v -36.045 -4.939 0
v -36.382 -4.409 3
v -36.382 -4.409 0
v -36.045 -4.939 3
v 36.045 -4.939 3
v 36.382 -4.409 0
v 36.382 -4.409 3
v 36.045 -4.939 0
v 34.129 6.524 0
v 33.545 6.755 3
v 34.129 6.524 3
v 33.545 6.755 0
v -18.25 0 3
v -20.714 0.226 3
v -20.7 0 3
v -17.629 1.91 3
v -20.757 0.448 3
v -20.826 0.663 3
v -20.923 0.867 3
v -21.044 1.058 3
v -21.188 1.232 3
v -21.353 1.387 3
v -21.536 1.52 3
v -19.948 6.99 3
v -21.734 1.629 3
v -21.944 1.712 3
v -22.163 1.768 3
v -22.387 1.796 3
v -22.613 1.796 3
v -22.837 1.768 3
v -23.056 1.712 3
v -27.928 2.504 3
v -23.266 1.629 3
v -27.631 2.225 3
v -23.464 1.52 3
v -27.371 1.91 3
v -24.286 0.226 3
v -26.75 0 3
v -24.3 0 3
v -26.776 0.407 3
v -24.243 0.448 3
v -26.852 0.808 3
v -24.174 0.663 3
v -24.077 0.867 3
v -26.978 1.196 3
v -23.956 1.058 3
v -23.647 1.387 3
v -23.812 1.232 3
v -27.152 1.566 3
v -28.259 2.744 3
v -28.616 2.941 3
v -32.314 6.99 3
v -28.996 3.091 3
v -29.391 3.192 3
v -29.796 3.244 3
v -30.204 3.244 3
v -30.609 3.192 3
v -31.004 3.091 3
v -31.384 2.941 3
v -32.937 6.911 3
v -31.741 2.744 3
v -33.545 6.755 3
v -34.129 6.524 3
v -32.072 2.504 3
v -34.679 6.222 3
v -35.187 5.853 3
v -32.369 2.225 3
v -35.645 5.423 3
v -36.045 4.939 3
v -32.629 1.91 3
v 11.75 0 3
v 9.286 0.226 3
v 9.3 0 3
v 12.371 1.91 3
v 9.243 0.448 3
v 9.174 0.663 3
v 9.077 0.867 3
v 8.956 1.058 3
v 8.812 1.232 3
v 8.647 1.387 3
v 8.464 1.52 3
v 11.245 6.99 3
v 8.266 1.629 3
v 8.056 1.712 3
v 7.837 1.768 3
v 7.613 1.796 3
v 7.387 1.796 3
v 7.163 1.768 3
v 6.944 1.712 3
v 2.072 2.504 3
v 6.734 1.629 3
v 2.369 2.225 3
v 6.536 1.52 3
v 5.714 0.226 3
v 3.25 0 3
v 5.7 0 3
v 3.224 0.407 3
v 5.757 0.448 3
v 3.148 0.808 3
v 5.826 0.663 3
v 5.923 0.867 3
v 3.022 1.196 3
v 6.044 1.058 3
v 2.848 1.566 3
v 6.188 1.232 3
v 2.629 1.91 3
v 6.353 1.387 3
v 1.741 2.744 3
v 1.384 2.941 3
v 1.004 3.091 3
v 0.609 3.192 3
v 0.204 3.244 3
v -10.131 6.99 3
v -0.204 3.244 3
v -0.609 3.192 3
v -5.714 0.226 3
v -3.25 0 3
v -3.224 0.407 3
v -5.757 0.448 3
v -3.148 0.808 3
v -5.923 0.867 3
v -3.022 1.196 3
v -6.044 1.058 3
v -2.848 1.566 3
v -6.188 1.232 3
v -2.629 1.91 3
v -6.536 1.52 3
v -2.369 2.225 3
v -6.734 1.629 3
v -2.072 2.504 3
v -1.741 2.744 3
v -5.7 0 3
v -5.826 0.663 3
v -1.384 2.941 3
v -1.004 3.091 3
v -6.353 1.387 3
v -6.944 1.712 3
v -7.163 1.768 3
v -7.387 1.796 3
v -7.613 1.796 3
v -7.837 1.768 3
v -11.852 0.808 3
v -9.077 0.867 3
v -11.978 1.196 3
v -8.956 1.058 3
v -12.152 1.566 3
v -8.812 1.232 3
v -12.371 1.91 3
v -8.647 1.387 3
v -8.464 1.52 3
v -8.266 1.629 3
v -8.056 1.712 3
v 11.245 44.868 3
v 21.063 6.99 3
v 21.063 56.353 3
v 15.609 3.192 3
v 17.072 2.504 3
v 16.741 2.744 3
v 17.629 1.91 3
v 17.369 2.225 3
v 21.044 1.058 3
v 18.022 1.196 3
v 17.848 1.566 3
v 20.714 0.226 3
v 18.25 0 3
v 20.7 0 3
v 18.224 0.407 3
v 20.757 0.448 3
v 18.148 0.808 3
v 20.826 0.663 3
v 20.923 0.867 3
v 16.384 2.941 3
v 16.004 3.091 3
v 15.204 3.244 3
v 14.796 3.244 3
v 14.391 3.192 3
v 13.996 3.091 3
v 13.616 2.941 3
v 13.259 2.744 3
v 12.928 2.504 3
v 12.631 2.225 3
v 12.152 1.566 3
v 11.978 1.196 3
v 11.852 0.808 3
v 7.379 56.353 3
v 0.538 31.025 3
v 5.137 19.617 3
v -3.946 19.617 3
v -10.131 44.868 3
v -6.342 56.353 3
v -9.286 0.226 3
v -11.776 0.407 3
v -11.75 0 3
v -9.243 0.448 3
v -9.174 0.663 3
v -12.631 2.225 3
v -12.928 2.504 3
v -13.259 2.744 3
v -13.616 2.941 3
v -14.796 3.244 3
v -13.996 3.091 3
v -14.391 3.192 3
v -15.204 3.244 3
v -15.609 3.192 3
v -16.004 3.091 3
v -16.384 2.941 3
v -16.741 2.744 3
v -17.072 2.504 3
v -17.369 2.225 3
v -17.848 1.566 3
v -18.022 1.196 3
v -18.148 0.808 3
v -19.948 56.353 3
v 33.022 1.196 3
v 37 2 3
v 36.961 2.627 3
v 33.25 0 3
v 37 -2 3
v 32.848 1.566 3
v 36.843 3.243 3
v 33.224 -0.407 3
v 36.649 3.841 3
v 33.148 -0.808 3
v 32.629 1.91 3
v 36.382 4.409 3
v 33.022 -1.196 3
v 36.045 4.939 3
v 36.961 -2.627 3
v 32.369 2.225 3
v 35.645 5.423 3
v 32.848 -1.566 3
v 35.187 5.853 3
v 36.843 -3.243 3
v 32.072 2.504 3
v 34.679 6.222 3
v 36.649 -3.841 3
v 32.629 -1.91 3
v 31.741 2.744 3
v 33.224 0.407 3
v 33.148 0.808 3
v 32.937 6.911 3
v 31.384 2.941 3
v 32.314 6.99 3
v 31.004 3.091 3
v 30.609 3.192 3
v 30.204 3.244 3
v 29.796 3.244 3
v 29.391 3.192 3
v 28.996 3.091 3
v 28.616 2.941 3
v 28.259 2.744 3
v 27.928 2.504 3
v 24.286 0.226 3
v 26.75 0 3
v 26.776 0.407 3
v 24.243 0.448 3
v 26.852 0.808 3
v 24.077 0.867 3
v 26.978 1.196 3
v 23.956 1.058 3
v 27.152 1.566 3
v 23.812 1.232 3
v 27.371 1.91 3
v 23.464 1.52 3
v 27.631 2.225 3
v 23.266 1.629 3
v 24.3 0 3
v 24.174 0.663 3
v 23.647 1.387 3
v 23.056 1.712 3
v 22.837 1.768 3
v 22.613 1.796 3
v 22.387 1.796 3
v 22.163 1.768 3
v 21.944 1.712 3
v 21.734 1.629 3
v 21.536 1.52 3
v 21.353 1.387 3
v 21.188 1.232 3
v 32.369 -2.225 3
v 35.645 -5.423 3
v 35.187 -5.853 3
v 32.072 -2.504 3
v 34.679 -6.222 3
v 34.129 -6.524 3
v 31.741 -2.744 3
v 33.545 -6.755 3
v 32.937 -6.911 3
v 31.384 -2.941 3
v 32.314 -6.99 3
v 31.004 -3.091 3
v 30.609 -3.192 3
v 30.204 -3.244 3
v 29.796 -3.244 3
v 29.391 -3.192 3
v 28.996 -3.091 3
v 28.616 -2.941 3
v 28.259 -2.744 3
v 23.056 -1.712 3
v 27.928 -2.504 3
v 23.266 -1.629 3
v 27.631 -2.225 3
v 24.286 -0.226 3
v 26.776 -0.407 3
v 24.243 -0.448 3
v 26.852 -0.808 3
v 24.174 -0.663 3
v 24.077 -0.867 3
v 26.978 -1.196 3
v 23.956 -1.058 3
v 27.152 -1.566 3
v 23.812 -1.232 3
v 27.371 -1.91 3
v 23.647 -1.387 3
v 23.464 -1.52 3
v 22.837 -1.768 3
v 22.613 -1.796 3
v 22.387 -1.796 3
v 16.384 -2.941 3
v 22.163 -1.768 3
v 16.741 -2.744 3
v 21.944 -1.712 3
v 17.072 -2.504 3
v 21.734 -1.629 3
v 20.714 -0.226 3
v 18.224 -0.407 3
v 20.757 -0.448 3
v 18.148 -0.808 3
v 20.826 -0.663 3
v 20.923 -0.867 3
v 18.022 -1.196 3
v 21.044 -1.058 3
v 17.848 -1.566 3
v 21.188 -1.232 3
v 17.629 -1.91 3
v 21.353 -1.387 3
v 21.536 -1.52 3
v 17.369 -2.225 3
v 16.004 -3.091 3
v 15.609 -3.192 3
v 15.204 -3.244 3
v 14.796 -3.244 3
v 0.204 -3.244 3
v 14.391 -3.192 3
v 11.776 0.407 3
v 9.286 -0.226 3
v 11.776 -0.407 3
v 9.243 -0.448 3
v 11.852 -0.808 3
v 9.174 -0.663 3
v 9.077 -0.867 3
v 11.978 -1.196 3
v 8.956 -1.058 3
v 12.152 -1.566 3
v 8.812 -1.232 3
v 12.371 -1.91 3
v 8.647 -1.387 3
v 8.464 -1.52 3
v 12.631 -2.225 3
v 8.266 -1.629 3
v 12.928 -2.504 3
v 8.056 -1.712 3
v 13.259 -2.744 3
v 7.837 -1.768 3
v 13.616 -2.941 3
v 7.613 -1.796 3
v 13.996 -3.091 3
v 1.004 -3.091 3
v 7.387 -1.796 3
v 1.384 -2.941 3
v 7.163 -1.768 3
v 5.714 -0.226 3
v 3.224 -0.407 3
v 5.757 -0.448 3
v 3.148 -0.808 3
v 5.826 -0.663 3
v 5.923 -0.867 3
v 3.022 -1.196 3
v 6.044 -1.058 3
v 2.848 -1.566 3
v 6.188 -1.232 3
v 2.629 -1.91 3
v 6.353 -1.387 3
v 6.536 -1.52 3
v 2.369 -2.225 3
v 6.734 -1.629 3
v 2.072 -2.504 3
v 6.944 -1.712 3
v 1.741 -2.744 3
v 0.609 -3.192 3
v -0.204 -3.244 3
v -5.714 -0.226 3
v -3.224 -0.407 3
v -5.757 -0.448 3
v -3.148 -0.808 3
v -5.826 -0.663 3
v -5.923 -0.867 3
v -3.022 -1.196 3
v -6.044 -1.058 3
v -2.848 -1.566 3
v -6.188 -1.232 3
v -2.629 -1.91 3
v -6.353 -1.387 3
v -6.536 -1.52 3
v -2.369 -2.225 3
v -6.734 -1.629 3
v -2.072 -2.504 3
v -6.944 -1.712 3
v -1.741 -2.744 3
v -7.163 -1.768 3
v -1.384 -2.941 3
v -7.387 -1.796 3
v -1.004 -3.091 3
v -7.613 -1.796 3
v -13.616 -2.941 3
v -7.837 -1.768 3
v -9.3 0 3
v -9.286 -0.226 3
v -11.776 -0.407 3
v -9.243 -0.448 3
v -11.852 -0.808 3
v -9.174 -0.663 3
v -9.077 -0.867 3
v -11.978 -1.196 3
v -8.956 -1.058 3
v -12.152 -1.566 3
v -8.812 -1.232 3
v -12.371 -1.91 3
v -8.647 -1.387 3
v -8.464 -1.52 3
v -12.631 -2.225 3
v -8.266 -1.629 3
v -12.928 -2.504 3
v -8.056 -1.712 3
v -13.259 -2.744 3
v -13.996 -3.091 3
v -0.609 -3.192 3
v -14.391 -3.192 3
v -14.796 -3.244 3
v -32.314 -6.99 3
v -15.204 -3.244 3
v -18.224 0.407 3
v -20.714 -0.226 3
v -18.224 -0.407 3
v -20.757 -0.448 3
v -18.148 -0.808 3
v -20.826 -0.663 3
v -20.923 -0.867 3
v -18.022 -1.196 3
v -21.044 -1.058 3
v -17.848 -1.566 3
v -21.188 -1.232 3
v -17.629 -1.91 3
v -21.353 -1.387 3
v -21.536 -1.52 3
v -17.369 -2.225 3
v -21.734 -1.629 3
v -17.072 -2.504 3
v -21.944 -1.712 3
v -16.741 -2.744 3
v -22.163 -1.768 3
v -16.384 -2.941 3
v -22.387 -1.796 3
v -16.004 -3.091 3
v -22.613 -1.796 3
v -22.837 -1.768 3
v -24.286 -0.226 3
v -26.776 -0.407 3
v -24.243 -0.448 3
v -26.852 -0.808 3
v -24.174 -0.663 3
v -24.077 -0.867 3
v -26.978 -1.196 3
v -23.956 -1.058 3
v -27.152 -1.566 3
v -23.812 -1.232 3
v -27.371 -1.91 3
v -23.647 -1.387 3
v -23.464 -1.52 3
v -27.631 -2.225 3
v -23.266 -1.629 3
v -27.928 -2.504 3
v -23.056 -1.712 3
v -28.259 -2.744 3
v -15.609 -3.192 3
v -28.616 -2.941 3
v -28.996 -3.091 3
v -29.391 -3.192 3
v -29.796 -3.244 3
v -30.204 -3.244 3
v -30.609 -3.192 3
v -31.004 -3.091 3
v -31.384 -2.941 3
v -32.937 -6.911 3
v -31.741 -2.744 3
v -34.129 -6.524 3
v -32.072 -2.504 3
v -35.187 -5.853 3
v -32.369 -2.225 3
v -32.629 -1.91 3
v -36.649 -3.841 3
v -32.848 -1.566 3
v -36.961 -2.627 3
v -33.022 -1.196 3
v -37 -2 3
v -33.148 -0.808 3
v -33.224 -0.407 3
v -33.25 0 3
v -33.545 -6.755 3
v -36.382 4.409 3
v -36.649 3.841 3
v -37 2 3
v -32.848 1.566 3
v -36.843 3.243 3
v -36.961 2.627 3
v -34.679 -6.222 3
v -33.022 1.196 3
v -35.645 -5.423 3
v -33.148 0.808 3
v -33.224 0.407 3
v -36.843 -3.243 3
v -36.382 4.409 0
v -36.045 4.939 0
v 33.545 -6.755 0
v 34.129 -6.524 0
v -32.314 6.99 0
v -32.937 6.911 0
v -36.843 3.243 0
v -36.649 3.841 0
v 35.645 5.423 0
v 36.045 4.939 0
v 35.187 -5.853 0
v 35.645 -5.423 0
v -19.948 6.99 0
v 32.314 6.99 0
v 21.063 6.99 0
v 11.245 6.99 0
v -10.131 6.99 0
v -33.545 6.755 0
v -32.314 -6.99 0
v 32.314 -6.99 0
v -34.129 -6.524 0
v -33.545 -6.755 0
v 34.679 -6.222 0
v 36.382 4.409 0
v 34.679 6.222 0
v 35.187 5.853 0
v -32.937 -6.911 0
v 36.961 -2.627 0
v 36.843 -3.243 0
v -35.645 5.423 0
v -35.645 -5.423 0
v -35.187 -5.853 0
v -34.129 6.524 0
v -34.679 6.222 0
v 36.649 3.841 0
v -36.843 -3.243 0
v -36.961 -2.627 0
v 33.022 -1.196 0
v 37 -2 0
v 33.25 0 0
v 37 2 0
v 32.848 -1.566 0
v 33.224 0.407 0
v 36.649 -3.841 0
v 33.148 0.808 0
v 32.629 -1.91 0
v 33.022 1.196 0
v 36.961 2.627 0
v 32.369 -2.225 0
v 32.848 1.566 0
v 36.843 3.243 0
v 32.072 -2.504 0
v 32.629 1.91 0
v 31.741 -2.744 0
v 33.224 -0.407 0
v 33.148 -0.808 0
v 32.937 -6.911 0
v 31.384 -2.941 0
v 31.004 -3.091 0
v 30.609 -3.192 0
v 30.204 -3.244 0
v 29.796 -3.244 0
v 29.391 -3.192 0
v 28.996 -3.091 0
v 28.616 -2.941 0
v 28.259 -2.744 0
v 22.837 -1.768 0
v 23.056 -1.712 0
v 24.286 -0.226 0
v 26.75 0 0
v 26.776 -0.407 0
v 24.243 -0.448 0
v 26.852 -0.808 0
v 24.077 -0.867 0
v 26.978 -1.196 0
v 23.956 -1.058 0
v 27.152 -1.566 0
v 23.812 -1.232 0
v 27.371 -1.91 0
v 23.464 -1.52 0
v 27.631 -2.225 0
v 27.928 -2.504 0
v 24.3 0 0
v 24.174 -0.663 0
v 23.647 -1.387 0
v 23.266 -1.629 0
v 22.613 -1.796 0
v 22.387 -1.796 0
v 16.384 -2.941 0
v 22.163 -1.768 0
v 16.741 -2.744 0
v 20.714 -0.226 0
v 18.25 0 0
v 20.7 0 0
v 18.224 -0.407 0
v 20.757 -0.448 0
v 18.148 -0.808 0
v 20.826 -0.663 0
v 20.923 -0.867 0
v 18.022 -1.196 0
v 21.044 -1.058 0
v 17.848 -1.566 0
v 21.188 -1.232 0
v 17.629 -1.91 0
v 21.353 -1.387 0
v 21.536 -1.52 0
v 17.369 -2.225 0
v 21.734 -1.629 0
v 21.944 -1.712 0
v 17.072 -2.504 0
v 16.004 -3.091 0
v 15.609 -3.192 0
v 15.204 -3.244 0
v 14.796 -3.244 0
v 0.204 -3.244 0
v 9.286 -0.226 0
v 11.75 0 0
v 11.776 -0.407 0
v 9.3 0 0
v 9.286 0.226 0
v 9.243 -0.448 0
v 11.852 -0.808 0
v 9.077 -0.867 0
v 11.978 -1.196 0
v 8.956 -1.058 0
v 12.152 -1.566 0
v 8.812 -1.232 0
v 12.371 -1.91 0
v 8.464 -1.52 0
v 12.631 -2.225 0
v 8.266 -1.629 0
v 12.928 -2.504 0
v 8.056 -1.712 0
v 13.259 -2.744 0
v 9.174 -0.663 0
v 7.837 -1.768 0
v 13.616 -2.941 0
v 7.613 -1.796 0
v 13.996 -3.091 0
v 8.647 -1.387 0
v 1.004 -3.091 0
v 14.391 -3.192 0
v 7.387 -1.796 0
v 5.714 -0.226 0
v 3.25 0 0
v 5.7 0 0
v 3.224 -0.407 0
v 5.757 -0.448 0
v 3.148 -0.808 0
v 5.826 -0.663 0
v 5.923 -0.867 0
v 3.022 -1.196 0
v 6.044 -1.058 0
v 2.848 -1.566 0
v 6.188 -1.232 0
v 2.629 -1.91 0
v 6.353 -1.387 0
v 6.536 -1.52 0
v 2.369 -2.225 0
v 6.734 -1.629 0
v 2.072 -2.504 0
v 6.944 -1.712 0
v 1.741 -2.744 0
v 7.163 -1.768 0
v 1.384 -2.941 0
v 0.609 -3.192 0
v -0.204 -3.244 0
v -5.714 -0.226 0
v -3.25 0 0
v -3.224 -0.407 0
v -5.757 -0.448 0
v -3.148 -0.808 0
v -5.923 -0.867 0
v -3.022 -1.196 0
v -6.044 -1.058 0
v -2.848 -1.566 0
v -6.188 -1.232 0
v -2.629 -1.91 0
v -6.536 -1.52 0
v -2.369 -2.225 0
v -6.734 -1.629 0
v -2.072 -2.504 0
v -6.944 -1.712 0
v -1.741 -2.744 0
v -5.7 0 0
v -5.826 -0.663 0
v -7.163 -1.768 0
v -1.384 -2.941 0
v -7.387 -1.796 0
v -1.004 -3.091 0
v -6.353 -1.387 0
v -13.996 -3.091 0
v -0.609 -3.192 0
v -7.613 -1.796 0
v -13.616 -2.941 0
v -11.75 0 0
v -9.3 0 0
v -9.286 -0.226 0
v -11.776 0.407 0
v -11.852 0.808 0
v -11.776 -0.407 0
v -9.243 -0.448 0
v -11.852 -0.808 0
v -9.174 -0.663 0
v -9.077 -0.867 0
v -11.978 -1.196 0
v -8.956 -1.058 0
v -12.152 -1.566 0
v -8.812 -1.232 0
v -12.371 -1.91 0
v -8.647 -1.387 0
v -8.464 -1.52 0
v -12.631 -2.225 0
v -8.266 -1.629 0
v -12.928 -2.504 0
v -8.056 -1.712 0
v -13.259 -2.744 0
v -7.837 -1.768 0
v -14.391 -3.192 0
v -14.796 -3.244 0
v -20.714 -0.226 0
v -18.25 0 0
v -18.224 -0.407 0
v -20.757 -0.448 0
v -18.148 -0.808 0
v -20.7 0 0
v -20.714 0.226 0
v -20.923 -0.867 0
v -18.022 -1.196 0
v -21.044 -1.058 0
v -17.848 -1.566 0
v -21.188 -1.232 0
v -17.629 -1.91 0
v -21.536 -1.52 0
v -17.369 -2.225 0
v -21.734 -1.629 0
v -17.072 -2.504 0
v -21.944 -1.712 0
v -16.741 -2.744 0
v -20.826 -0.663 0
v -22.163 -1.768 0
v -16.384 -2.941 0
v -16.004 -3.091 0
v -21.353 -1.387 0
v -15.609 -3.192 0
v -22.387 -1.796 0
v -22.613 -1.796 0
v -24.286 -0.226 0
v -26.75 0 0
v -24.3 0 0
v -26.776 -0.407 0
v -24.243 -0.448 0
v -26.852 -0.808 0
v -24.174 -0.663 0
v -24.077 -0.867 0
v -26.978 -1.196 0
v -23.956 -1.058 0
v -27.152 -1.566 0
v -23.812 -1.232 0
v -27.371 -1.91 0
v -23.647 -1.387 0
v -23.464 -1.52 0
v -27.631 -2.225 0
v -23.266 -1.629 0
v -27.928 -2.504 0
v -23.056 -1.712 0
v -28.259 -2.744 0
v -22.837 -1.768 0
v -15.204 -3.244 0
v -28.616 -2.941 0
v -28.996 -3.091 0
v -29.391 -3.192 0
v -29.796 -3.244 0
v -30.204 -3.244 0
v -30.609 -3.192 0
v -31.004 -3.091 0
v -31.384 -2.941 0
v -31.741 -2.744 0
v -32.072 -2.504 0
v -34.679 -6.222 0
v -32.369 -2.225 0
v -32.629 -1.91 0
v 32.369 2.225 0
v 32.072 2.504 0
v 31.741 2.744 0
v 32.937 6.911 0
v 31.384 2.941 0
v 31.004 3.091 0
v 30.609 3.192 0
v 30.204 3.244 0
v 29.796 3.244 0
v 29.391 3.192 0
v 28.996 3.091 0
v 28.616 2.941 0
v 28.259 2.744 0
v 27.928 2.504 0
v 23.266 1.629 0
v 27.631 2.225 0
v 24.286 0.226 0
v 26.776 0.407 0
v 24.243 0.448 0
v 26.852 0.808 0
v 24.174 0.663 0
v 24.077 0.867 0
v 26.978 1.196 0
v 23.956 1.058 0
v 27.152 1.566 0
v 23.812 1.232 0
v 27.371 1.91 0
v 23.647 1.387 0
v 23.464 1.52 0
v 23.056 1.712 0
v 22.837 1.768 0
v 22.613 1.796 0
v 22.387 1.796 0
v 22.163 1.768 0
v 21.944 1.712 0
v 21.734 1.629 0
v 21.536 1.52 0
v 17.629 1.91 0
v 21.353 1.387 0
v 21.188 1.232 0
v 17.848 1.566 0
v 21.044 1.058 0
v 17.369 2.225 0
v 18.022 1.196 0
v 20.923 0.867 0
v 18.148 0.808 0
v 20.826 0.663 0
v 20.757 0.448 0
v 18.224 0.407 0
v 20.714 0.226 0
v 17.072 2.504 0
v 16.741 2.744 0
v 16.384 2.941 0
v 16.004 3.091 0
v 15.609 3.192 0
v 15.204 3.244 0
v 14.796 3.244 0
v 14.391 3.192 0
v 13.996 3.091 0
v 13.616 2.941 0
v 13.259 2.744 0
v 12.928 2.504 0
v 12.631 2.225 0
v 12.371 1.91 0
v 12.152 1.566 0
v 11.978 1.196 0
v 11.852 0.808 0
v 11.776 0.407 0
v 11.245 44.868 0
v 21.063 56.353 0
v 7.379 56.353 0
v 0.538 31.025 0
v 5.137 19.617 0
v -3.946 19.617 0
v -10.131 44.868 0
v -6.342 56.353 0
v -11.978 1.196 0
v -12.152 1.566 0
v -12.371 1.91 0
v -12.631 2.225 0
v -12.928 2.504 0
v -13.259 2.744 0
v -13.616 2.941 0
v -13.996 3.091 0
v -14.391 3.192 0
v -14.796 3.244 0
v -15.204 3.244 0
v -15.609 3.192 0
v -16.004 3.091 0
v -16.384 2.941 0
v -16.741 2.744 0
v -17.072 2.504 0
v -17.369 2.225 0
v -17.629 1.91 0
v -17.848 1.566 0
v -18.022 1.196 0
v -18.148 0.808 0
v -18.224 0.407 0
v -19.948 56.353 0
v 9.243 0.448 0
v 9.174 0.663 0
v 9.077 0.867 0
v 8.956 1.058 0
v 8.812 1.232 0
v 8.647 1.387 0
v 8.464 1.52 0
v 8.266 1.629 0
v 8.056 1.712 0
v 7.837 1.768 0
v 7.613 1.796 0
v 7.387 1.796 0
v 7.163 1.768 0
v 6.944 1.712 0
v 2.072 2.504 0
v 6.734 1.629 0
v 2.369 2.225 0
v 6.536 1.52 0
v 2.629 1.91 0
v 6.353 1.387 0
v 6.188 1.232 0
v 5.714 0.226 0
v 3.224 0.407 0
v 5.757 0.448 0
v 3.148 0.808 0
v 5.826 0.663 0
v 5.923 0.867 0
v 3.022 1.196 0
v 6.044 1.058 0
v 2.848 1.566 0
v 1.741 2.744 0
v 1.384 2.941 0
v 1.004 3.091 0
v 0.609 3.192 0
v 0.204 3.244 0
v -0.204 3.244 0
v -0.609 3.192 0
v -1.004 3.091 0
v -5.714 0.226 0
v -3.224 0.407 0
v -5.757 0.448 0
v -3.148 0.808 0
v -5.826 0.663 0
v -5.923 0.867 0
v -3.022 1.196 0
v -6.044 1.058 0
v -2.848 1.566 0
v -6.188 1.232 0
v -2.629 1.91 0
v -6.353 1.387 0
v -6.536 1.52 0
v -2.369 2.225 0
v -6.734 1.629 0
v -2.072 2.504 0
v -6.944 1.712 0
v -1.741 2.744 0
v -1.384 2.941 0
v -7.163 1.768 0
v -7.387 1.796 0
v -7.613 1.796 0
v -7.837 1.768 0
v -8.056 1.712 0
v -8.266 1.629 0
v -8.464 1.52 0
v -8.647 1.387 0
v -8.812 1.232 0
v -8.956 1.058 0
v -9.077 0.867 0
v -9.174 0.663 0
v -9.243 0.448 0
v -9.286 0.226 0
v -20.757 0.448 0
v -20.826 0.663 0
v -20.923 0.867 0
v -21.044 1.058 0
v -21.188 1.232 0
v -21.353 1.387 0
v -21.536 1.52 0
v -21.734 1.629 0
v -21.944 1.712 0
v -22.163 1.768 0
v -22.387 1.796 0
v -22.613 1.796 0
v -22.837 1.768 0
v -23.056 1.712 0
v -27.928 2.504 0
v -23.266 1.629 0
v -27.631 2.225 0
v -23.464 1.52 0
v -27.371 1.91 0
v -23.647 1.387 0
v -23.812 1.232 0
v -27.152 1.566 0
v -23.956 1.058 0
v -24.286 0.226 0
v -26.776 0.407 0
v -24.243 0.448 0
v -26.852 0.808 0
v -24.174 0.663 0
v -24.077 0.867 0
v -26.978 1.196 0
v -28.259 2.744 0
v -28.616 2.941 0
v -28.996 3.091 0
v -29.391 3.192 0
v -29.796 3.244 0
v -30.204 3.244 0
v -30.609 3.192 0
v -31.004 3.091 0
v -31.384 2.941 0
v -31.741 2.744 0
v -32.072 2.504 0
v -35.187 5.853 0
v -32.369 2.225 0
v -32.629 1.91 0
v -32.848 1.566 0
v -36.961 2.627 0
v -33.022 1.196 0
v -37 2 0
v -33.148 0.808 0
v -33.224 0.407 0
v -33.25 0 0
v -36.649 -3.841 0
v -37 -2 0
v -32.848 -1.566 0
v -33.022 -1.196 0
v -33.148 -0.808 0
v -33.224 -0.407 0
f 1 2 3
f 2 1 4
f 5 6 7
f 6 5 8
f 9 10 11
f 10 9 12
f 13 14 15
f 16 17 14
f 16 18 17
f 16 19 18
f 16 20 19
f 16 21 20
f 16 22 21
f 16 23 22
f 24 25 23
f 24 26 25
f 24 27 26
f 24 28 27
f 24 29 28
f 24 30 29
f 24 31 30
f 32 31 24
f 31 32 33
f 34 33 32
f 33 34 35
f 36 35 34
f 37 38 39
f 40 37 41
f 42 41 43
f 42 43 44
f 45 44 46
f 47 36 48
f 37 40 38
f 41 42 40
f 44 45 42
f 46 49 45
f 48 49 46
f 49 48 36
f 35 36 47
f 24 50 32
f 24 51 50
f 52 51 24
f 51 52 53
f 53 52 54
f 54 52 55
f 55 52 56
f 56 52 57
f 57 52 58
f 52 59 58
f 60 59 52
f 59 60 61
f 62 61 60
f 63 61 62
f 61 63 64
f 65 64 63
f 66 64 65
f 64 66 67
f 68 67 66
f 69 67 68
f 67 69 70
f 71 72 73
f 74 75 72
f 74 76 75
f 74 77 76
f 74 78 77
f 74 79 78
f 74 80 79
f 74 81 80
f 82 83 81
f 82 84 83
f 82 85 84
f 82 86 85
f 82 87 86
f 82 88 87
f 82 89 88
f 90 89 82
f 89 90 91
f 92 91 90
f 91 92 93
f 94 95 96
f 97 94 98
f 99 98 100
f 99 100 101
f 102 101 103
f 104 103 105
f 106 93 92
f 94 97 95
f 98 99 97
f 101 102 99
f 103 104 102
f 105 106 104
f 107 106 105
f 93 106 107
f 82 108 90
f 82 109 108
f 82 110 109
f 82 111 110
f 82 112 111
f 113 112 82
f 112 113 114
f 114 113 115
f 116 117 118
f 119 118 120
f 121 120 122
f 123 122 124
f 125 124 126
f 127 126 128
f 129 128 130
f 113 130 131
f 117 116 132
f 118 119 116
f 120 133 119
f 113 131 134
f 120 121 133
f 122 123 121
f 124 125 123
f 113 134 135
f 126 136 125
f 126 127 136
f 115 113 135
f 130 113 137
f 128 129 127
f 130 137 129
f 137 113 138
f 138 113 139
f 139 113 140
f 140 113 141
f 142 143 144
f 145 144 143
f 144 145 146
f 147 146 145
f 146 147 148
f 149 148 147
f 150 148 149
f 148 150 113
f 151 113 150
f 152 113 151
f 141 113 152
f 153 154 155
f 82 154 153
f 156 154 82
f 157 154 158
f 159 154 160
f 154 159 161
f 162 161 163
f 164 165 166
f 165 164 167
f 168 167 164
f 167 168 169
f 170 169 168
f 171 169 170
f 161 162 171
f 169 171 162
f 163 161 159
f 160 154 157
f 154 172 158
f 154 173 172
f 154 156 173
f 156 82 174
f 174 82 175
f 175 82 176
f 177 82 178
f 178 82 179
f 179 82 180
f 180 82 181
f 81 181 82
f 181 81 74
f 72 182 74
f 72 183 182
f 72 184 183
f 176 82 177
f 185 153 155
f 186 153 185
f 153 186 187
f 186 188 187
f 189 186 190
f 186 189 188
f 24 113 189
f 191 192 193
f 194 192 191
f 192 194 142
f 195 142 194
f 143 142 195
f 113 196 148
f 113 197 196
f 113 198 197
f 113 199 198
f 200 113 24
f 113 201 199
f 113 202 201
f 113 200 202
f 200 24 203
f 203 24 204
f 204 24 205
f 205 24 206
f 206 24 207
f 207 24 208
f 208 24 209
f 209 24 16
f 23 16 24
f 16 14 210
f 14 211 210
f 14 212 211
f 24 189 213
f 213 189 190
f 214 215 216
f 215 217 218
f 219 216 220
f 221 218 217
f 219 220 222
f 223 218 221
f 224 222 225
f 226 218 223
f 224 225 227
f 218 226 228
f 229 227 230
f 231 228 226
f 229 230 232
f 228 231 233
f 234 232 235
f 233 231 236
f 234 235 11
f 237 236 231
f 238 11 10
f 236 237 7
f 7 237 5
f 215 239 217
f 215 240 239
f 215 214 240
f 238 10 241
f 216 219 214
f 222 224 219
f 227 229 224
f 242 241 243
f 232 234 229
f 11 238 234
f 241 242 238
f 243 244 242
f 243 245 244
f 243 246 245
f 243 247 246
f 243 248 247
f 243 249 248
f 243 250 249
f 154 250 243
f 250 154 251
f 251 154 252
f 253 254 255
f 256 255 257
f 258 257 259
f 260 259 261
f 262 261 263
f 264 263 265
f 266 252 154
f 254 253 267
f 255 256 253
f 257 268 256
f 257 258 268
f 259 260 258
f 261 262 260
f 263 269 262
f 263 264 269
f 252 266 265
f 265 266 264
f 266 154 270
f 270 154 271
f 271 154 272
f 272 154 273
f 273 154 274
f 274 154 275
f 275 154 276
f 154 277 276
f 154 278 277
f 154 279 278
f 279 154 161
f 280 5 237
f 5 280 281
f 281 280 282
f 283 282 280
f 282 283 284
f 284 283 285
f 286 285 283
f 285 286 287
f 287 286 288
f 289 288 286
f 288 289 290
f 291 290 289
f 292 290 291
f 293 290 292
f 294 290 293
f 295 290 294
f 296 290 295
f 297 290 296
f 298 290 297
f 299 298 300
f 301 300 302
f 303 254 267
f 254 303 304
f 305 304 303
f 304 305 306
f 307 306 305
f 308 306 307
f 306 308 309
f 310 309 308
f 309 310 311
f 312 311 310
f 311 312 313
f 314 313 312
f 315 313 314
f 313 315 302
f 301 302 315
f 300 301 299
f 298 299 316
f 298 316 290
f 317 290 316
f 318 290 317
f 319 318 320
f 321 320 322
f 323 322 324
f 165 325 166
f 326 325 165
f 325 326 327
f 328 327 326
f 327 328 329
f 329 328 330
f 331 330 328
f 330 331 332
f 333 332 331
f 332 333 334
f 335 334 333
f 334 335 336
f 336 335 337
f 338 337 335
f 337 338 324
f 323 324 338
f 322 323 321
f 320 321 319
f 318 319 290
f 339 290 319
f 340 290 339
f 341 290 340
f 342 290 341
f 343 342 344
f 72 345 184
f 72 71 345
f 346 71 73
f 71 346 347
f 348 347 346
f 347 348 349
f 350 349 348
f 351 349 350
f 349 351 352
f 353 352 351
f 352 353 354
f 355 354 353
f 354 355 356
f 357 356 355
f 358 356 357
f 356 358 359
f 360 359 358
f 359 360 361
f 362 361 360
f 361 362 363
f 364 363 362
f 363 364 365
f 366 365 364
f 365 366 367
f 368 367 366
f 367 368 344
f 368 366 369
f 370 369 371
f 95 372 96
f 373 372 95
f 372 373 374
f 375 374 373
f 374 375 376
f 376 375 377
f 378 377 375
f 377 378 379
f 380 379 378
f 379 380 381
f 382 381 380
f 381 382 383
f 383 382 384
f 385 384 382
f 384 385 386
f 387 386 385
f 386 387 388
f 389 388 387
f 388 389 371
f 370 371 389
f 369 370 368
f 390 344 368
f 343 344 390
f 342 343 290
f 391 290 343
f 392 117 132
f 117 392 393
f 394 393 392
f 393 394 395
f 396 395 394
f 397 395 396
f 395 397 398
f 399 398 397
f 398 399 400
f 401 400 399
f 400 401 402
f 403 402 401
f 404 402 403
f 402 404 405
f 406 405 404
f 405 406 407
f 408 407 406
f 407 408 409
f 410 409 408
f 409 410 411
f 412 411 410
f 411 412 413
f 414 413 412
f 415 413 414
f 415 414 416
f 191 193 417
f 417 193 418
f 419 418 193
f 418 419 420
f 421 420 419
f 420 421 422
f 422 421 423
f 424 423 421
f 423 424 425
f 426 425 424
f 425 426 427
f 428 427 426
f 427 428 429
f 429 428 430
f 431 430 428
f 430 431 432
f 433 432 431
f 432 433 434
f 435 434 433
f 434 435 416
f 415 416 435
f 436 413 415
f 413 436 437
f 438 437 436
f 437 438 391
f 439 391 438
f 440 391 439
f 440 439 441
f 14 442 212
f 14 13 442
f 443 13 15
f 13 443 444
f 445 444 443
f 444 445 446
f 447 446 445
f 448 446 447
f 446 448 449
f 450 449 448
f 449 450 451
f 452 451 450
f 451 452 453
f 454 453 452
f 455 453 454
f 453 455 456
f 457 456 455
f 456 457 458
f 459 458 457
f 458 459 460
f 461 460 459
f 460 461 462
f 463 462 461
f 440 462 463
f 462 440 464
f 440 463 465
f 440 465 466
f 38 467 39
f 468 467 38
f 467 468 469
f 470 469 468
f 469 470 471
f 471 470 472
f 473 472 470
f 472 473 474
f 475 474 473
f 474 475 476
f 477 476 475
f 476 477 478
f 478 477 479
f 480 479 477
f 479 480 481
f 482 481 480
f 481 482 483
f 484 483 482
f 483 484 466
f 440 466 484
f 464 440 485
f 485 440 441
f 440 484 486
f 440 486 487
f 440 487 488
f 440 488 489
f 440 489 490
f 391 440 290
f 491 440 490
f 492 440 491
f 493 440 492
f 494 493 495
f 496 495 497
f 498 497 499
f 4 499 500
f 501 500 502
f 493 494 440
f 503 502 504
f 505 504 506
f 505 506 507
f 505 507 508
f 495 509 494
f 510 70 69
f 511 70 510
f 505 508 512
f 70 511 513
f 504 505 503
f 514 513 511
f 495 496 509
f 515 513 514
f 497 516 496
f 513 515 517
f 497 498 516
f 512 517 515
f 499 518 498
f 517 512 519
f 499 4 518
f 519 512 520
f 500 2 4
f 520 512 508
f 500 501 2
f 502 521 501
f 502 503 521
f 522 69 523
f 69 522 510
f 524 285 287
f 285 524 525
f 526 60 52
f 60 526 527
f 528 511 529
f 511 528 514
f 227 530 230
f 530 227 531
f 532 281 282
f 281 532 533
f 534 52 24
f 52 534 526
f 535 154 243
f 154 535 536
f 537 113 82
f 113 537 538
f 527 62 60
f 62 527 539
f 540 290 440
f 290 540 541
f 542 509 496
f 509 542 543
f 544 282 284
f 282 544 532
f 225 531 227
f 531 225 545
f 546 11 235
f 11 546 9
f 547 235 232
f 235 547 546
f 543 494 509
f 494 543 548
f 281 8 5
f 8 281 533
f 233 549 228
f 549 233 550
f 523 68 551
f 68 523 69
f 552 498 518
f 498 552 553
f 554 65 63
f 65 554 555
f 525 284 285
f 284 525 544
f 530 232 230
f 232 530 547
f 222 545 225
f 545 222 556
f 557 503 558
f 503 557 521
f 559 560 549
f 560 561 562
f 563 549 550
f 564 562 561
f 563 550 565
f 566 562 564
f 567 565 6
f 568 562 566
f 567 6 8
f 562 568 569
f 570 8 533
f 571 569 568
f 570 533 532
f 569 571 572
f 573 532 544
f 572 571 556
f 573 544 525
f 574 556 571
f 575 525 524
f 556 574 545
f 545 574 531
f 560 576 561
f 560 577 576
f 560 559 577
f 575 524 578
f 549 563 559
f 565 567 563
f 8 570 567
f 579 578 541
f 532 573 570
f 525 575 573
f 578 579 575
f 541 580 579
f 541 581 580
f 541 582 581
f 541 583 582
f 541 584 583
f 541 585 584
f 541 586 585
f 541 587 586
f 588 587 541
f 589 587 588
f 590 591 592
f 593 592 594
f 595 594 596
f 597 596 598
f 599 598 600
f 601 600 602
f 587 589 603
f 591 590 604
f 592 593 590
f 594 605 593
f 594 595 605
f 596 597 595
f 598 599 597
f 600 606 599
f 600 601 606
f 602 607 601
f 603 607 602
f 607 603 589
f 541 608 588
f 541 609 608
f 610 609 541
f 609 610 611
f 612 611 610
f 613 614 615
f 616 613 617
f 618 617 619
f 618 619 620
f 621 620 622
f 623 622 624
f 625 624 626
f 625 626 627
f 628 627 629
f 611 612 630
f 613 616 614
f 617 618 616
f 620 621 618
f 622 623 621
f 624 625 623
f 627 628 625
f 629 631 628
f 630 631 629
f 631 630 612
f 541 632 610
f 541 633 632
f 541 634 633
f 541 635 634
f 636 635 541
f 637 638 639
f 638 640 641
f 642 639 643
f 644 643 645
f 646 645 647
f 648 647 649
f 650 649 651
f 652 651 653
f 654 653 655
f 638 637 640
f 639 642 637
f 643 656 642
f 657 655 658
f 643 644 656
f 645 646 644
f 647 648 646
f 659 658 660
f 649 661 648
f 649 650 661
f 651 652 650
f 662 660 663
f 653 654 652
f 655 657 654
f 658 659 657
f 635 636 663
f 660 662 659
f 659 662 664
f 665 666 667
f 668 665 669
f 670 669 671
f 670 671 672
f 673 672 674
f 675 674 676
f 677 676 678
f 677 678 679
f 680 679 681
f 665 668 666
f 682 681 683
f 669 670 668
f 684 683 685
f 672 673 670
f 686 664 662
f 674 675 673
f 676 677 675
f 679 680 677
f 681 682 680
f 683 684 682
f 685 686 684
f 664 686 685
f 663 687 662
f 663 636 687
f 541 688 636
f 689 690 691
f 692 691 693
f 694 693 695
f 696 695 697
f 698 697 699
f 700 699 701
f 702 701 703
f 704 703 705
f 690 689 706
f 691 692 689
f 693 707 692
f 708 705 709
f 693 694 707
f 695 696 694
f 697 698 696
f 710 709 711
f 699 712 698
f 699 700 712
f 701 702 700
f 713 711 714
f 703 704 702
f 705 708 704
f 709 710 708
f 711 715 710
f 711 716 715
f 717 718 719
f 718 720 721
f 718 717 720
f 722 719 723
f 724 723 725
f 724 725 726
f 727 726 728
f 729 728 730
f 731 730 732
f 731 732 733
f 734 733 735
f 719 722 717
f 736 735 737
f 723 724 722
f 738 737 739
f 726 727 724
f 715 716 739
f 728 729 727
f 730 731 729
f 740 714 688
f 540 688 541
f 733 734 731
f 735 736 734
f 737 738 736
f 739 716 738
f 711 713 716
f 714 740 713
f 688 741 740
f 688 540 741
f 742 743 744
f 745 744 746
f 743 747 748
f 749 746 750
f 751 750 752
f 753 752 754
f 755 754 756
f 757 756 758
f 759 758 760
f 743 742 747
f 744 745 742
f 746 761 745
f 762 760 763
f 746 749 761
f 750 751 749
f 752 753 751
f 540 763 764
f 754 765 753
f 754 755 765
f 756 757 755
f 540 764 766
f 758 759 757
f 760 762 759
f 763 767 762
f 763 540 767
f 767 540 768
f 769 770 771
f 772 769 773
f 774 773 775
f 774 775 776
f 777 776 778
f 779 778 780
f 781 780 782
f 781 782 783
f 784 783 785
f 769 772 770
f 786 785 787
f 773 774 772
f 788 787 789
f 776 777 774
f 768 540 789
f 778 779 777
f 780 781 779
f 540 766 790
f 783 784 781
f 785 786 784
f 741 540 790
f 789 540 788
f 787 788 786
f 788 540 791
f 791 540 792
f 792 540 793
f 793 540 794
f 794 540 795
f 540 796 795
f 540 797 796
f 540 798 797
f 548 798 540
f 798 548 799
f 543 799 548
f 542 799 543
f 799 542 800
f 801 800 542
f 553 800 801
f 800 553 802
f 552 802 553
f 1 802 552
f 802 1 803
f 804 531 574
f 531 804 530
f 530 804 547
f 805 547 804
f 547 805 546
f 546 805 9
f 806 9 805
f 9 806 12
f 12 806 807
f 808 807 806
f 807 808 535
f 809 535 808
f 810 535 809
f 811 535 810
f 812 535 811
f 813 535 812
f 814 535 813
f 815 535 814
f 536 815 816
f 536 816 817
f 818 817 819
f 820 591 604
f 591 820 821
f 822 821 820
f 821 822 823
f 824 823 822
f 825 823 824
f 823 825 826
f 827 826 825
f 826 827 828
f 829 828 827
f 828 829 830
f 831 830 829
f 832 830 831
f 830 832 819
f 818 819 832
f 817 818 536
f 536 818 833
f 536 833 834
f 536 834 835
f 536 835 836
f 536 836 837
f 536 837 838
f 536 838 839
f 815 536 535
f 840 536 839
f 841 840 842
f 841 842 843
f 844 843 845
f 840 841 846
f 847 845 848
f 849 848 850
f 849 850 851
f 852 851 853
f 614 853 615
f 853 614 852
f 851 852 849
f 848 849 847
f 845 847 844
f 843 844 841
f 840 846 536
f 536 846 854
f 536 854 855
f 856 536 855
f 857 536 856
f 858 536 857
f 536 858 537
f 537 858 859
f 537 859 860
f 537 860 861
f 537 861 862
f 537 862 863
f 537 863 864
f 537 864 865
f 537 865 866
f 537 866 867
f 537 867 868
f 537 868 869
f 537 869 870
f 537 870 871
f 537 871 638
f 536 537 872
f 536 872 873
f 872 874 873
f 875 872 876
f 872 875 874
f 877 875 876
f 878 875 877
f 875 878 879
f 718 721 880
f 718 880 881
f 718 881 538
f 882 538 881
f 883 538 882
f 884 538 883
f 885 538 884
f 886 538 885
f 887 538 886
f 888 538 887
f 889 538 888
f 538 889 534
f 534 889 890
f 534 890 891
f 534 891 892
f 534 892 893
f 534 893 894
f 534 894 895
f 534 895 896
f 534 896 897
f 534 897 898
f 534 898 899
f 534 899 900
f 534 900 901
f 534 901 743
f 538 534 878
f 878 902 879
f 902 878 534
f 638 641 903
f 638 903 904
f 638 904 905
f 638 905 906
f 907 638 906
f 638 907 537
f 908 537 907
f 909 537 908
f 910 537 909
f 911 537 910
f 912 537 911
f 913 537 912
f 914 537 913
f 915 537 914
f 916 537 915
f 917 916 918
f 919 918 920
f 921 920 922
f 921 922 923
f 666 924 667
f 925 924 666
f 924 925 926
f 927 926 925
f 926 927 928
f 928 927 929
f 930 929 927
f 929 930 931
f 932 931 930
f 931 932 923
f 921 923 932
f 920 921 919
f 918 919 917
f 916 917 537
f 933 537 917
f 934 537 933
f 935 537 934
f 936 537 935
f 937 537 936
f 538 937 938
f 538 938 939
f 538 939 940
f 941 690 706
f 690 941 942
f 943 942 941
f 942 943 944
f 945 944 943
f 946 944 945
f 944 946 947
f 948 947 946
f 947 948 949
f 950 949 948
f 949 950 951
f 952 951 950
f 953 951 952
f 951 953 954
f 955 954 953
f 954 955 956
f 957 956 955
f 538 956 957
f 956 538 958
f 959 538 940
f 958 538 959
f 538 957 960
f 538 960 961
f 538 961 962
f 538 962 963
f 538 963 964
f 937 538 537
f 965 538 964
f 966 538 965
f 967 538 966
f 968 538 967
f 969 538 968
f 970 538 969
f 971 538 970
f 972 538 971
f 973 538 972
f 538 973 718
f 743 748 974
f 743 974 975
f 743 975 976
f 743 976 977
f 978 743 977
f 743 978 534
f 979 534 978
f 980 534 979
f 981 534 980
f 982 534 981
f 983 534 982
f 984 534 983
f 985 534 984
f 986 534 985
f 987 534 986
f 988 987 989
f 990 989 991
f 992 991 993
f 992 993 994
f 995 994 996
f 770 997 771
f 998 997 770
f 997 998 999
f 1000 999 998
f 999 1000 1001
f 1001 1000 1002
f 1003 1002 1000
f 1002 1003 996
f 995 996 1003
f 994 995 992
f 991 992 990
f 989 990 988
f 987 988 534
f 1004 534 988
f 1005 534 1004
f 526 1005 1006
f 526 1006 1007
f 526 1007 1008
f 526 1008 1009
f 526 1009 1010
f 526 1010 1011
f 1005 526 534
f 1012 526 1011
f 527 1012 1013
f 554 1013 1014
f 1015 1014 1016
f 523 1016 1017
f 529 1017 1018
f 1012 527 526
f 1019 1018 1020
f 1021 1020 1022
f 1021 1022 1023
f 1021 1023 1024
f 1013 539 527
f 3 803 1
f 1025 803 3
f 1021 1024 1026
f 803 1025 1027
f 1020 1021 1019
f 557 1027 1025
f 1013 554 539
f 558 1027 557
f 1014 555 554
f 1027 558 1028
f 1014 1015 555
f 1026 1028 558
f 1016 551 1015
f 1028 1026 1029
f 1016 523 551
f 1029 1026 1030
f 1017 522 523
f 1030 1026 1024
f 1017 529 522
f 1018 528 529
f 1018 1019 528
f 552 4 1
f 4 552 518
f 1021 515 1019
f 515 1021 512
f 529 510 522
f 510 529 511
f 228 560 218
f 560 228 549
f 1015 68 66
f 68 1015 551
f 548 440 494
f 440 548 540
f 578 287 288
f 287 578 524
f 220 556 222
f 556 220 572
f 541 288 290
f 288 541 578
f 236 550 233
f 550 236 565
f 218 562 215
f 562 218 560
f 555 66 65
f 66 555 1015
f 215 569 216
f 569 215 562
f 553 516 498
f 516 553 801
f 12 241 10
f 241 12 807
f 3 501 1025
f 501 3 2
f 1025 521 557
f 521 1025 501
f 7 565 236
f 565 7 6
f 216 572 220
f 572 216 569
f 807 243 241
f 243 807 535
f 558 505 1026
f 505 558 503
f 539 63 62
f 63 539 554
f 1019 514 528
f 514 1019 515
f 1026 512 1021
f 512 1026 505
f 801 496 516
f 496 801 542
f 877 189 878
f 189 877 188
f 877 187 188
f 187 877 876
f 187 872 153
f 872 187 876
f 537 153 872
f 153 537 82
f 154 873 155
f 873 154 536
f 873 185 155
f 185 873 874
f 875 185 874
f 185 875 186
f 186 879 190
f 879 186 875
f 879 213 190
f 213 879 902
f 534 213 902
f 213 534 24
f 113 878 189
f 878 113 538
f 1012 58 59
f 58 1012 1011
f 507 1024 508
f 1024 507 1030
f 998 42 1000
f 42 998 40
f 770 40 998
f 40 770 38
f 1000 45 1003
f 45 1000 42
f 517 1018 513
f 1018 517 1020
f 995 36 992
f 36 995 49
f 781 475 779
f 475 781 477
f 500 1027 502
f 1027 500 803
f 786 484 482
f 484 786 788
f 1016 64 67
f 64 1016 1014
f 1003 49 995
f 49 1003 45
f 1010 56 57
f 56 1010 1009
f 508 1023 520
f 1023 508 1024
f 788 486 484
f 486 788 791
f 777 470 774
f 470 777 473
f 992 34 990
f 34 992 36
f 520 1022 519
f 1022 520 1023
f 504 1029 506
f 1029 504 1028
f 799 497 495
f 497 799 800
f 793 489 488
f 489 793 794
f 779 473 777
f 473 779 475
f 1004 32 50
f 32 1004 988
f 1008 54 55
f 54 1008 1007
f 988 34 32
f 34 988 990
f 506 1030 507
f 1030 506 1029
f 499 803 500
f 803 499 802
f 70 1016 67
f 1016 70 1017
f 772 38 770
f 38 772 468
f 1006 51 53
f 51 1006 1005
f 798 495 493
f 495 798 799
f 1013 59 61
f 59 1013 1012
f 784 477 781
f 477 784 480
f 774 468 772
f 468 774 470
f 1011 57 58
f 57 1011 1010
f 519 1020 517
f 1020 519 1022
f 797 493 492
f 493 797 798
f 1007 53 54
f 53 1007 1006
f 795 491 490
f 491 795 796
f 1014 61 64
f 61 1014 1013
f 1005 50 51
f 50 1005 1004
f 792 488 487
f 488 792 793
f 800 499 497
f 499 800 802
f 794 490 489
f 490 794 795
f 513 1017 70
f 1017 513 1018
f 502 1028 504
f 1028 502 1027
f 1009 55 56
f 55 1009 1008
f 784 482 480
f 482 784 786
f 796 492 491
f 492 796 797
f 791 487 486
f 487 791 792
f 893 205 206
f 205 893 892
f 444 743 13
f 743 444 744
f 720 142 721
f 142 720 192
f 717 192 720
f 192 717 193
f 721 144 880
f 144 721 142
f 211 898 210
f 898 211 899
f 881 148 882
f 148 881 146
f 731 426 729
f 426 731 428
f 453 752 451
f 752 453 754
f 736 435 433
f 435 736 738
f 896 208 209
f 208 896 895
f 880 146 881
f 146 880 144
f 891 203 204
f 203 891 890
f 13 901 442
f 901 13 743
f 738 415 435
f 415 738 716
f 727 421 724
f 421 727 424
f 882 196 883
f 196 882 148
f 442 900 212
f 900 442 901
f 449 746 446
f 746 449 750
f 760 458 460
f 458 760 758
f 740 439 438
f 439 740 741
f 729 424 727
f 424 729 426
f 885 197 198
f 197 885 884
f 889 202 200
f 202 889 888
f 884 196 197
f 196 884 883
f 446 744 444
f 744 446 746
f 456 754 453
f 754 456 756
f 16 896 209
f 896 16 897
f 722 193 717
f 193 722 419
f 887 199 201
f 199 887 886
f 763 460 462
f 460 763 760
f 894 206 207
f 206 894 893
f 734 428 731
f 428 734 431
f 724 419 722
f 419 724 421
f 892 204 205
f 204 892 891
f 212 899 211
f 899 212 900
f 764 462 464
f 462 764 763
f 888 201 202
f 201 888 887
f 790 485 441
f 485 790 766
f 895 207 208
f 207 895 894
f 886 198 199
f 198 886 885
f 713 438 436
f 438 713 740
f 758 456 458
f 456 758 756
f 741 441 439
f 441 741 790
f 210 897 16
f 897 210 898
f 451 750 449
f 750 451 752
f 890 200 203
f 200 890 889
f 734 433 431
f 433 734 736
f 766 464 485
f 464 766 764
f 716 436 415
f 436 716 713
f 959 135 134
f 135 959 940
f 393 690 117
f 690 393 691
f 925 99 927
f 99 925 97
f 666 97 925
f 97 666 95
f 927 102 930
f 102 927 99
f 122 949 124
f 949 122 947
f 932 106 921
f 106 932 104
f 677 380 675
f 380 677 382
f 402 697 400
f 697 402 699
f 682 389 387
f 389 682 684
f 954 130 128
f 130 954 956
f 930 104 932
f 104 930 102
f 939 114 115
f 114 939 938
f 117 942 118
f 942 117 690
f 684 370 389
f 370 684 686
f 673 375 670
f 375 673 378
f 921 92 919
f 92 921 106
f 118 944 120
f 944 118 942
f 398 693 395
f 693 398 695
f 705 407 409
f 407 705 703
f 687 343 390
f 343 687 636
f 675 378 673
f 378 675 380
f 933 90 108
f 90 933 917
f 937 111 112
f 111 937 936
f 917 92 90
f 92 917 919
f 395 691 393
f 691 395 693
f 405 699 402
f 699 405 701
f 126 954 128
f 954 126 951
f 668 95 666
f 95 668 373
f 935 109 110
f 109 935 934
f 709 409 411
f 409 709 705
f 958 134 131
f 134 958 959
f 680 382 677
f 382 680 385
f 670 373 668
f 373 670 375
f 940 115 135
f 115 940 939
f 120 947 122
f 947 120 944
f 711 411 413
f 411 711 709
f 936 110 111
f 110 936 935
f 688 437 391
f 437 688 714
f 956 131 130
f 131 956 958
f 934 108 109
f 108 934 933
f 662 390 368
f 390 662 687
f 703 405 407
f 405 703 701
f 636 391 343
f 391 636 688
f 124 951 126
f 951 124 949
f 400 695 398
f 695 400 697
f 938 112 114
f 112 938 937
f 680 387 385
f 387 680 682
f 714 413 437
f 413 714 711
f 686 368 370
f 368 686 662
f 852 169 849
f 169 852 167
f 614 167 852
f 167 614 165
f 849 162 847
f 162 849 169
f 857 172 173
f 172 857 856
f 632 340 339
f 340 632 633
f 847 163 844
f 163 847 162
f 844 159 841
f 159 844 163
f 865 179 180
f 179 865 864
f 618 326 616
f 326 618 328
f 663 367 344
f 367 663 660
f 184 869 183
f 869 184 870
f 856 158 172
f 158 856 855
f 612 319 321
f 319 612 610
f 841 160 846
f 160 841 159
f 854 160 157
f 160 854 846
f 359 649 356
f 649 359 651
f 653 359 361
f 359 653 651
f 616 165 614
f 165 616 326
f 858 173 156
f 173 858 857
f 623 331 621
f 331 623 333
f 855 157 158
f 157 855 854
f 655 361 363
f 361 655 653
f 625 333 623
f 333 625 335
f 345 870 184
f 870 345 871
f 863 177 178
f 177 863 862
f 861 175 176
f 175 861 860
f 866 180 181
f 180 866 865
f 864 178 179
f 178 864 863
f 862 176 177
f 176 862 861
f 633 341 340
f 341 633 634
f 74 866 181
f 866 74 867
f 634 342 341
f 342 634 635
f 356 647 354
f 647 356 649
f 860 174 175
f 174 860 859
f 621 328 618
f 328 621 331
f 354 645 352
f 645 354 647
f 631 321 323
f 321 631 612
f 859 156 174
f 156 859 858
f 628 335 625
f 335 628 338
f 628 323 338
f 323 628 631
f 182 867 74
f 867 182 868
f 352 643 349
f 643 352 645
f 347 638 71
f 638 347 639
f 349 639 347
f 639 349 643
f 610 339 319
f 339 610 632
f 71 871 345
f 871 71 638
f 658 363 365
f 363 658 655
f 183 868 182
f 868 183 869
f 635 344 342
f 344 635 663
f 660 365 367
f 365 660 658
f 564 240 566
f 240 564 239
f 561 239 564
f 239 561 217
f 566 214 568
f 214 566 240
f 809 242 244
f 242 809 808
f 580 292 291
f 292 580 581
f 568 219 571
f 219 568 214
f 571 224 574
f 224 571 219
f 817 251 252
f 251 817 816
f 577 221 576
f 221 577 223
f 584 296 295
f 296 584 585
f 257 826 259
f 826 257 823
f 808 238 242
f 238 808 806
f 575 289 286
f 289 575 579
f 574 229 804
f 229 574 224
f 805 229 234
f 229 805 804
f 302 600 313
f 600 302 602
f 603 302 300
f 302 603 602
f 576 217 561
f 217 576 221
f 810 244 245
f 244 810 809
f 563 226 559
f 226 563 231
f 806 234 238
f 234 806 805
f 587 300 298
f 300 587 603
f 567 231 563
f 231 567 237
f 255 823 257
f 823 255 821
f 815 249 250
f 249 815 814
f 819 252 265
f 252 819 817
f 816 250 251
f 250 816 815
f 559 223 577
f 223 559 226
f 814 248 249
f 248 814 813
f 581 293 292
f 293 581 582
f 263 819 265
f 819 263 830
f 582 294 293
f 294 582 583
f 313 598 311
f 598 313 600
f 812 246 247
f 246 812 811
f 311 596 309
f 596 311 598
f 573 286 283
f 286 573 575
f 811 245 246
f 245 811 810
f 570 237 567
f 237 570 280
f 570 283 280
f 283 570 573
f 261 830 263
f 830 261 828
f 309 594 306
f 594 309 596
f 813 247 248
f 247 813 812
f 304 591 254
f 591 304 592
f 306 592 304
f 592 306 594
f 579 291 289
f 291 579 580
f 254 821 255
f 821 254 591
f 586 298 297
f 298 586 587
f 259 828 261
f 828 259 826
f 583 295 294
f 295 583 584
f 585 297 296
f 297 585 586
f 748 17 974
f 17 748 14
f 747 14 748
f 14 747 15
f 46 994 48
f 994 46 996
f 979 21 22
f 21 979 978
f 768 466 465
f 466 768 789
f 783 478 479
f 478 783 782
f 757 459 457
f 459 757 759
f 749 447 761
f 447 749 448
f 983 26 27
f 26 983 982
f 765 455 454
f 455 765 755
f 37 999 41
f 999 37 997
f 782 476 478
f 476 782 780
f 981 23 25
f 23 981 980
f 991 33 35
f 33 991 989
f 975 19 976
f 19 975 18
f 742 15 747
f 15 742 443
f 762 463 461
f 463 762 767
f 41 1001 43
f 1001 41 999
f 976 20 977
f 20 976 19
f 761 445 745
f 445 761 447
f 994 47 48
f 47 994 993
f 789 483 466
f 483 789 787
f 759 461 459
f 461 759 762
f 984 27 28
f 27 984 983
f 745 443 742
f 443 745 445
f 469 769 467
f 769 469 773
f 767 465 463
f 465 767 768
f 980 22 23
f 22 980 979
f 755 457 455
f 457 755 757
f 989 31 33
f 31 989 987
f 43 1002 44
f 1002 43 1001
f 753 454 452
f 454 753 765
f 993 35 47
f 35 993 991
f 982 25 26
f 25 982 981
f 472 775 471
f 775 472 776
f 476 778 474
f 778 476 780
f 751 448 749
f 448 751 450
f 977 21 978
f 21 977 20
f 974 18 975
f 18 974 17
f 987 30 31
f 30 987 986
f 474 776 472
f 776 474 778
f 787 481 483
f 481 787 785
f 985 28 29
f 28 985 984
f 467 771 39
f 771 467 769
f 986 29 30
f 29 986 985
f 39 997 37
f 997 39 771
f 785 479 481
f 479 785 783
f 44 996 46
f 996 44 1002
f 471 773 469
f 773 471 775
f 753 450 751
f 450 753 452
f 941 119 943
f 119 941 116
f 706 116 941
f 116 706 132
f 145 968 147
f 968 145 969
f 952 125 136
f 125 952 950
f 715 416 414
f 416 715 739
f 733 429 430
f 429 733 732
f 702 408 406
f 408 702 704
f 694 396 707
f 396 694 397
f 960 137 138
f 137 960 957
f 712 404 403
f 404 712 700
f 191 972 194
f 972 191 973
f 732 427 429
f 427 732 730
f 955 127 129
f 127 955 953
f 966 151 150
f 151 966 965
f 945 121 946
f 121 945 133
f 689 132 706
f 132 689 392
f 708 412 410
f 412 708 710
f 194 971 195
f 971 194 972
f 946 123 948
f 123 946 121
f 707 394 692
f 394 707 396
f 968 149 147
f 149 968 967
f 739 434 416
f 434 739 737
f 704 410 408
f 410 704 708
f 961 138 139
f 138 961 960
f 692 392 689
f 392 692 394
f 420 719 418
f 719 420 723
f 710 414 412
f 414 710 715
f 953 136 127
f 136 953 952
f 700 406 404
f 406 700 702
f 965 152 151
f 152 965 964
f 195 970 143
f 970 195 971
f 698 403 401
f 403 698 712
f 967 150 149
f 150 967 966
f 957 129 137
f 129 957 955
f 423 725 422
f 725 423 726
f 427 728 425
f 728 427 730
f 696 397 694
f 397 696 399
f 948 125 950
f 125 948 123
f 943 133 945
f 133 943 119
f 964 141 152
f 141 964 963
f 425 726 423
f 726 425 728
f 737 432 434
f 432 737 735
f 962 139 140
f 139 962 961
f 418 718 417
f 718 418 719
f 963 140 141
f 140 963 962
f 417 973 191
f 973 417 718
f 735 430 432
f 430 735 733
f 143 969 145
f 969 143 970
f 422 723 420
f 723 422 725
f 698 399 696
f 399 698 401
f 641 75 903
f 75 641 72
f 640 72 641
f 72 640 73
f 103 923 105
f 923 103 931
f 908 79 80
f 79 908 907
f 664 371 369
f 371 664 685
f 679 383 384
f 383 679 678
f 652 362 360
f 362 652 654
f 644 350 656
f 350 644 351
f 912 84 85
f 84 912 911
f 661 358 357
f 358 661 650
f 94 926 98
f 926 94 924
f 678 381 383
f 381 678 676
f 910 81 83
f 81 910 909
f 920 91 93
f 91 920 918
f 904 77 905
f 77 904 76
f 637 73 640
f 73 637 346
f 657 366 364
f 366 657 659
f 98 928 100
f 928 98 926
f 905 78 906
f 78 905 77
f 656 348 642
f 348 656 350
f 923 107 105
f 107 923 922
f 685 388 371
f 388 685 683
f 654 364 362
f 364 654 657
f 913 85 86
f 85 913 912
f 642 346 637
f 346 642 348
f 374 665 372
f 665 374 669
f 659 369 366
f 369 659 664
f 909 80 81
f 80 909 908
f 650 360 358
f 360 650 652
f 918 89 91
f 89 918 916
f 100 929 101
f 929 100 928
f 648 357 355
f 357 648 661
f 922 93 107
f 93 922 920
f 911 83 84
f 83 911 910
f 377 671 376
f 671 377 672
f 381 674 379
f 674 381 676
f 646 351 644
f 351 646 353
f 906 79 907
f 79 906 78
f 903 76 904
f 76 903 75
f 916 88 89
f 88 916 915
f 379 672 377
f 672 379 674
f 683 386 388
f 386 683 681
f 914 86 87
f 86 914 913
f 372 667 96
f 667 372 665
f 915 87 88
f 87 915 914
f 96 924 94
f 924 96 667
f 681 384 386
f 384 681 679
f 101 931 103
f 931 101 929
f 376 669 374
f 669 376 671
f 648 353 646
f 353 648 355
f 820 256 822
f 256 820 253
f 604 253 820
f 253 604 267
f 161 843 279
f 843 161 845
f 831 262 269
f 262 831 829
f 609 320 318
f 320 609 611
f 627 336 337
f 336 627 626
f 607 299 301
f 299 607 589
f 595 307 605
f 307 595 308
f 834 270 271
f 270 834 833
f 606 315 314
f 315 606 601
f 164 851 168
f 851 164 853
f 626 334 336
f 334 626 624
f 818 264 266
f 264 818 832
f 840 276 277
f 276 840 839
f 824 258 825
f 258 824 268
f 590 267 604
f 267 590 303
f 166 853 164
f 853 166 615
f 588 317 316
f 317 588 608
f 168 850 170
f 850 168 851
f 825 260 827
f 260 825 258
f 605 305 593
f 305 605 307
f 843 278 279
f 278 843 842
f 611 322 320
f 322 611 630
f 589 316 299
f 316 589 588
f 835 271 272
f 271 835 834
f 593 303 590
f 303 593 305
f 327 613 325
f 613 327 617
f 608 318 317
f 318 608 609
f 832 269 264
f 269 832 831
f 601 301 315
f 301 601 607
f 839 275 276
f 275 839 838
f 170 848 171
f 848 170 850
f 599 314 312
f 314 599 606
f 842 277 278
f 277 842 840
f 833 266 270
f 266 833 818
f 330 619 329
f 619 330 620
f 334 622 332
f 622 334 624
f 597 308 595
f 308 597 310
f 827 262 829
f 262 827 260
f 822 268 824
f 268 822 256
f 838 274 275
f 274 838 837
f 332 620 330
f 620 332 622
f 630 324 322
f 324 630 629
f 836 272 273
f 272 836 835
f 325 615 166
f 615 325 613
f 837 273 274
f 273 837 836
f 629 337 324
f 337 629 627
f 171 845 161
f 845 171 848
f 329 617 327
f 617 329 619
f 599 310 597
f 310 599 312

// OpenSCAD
$fn = 50;


difference() {
	union() {
		hull() {
			translate(v = [-32.0000000000, 2.0000000000, 0]) {
				cylinder(h = 3, r = 5);
			}
			translate(v = [32.0000000000, 2.0000000000, 0]) {
				cylinder(h = 3, r = 5);
			}
			translate(v = [-32.0000000000, -2.0000000000, 0]) {
				cylinder(h = 3, r = 5);
			}
			translate(v = [32.0000000000, -2.0000000000, 0]) {
				cylinder(h = 3, r = 5);
			}
		}
		translate(v = [0, 55, 0]) {
			linear_extrude(height = 3) {
				text(font = "DejaVu Sans Mono:style=Bold", halign = "center", size = 57.0000000000, text = "M", valign = "top");
			}
		}
	}
	union() {
		translate(v = [-30.0000000000, 0.0000000000, 0]) {
			translate(v = [0, 0, -100]) {
				cylinder(h = 200, r = 3.2500000000);
			}
		}
		translate(v = [-15.0000000000, 0.0000000000, 0]) {
			translate(v = [0, 0, -100]) {
				cylinder(h = 200, r = 3.2500000000);
			}
		}
		translate(v = [0, 0, -100]) {
			cylinder(h = 200, r = 3.2500000000);
		}
		translate(v = [15.0000000000, 0.0000000000, 0]) {
			translate(v = [0, 0, -100]) {
				cylinder(h = 200, r = 3.2500000000);
			}
		}
		translate(v = [30.0000000000, 0.0000000000, 0]) {
			translate(v = [0, 0, -100]) {
				cylinder(h = 200, r = 3.2500000000);
			}
		}
		translate(v = [-30.0000000000, 0.0000000000, 0]) {
			translate(v = [0, 0, -100]) {
				cylinder(h = 200, r = 1.8000000000);
			}
		}
		translate(v = [-22.5000000000, 0.0000000000, 0]) {
			translate(v = [0, 0, -100]) {
				cylinder(h = 200, r = 1.8000000000);
			}
		}
		translate(v = [-15.0000000000, 0.0000000000, 0]) {
			translate(v = [0, 0, -100]) {
				cylinder(h = 200, r = 1.8000000000);
			}
		}
		translate(v = [-7.5000000000, 0.0000000000, 0]) {
			translate(v = [0, 0, -100]) {
				cylinder(h = 200, r = 1.8000000000);
			}
		}
		translate(v = [0, 0, -100]) {
			cylinder(h = 200, r = 1.8000000000);
		}
		translate(v = [7.5000000000, 0.0000000000, 0]) {
			translate(v = [0, 0, -100]) {
				cylinder(h = 200, r = 1.8000000000);
			}
		}
		translate(v = [15.0000000000, 0.0000000000, 0]) {
			translate(v = [0, 0, -100]) {
				cylinder(h = 200, r = 1.8000000000);
			}
		}
		translate(v = [22.5000000000, 0.0000000000, 0]) {
			translate(v = [0, 0, -100]) {
				cylinder(h = 200, r = 1.8000000000);
			}
		}
		translate(v = [30.0000000000, 0.0000000000, 0]) {
			translate(v = [0, 0, -100]) {
				cylinder(h = 200, r = 1.8000000000);
			}
		}
	}
}
